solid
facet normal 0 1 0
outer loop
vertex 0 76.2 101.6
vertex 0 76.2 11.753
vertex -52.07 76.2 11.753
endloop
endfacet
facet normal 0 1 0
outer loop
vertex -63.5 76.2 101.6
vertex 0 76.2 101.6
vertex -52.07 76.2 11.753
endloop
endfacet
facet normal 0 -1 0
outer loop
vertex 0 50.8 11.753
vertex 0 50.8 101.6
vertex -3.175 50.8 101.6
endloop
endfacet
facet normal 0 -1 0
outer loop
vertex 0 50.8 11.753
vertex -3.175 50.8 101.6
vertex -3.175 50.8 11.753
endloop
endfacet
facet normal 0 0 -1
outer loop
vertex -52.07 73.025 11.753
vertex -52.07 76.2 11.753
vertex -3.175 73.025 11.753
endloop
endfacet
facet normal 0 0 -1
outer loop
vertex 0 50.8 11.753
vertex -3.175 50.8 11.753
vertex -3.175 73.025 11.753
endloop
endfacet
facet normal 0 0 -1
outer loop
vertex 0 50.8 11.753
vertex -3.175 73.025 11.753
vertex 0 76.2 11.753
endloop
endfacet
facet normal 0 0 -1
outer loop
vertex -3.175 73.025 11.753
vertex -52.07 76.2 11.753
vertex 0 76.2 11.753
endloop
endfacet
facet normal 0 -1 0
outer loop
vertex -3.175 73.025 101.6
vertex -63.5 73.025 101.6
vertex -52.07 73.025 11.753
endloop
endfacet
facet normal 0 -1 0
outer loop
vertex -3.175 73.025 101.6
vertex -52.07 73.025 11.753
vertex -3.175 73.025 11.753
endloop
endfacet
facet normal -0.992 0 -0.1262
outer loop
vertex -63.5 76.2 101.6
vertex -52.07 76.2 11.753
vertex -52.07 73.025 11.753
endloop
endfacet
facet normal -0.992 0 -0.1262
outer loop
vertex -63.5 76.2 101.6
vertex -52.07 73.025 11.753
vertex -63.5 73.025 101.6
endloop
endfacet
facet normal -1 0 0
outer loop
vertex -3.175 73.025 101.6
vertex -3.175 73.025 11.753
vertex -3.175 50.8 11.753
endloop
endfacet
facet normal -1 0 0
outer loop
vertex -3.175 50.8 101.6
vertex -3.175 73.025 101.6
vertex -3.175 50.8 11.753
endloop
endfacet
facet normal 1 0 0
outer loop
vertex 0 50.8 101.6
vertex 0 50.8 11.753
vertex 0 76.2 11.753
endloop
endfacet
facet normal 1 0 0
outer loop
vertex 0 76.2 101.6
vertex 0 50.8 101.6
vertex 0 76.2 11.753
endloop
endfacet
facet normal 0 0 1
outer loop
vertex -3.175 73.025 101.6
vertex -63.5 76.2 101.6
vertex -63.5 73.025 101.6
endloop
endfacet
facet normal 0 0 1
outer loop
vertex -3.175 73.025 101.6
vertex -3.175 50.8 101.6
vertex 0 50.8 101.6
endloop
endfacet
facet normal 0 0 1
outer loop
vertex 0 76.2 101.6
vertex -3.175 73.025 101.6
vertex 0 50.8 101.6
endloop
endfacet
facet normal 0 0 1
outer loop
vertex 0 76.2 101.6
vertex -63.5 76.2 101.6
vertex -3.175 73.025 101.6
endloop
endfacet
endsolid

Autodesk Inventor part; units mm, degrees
sketch "Sketch3" plane through (0, 0, 0) normal (0, 0, 1) x (1, 0, 0)
  line L0 (0, 0) -> (0, 76.2)
  line L1 (0, 76.2) -> (-76.2, 76.2)
  line L2 (-76.2, 73.025) -> (-3.175, 73.025)
  line L3 (-3.175, 73.025) -> (-3.175, 0)
  line L4 (-76.2, 73.025) -> (-76.2, 76.2)
  line L5 (-3.175, 0) -> (0, 0)
  dimension "d8" = 76.2
  dimension "d9" = 76.2
  dimension "d10" = 3.175
extrude "Extrusion2" add sketch "Sketch3" along normal blind 101.6
sketch "Sketch4" plane through (-76.2, 76.2, 0) normal (0, 1, 0) x (1, 0, 0)
  line L0 (24.13, -11.7529) -> (12.7, -101.6)
  line L1 (0, 0) -> (0, -101.6) projected
  line L2 (24.13, -11.7529) -> (76.2, -11.7529)
  line L3 (76.2, 0) -> (0, 0) projected
  line L4 (76.2, 0) -> (0, 0)
  line L5 (76.2, 0) -> (76.2, -11.7529)
  line L6 (12.7, -101.6) -> (0, -101.6)
  line L7 (0, 0) -> (0, -101.6)
  line L8 (76.2, 0) -> (76.2, -101.6) projected
  dimension "d16" = 7.25
  dimension "d17" = 63.5
  dimension "d18" = 52.07
extrude "Extrusion3" cut sketch "Sketch4" against normal blind 76.2
ref_plane "Work Plane4" through (-3.175, 0, 101.6) normal (0, -0.7071, 0.7071) x (1, 0, 0)
ref_plane "Work Plane6" through (-63.5, 65.8978, 101.6) normal (0.1262, 0, -0.992) x (0, -1, 0)
sketch "Sketch6" plane through (0, 0, 101.6) normal (1, 0, 0) x (0, 0, -1)
  line L0 (0, 0) -> (0, 76.2) projected
  line L1 (0, 50.8) -> (89.8471, 50.8)
  line L2 (89.8471, 0) -> (0, 0) projected
  line L3 (89.8471, 50.8) -> (89.8471, 0)
  line L4 (89.8471, 0) -> (0, 0)
  line L5 (0, 0) -> (0, 50.8)
  point P0 (101.6, 0)
  dimension "d34" = 50.8
extrude "Extrusion5" cut sketch "Sketch6" against normal blind 25.4
ref_plane "Work Plane7" through (0, 50.8, 11.7529) normal (0, -0.7071, -0.7071) x (-1, 0, 0)
properties part number "BlockForShieldPlacement" material "Aluminum 6061"
